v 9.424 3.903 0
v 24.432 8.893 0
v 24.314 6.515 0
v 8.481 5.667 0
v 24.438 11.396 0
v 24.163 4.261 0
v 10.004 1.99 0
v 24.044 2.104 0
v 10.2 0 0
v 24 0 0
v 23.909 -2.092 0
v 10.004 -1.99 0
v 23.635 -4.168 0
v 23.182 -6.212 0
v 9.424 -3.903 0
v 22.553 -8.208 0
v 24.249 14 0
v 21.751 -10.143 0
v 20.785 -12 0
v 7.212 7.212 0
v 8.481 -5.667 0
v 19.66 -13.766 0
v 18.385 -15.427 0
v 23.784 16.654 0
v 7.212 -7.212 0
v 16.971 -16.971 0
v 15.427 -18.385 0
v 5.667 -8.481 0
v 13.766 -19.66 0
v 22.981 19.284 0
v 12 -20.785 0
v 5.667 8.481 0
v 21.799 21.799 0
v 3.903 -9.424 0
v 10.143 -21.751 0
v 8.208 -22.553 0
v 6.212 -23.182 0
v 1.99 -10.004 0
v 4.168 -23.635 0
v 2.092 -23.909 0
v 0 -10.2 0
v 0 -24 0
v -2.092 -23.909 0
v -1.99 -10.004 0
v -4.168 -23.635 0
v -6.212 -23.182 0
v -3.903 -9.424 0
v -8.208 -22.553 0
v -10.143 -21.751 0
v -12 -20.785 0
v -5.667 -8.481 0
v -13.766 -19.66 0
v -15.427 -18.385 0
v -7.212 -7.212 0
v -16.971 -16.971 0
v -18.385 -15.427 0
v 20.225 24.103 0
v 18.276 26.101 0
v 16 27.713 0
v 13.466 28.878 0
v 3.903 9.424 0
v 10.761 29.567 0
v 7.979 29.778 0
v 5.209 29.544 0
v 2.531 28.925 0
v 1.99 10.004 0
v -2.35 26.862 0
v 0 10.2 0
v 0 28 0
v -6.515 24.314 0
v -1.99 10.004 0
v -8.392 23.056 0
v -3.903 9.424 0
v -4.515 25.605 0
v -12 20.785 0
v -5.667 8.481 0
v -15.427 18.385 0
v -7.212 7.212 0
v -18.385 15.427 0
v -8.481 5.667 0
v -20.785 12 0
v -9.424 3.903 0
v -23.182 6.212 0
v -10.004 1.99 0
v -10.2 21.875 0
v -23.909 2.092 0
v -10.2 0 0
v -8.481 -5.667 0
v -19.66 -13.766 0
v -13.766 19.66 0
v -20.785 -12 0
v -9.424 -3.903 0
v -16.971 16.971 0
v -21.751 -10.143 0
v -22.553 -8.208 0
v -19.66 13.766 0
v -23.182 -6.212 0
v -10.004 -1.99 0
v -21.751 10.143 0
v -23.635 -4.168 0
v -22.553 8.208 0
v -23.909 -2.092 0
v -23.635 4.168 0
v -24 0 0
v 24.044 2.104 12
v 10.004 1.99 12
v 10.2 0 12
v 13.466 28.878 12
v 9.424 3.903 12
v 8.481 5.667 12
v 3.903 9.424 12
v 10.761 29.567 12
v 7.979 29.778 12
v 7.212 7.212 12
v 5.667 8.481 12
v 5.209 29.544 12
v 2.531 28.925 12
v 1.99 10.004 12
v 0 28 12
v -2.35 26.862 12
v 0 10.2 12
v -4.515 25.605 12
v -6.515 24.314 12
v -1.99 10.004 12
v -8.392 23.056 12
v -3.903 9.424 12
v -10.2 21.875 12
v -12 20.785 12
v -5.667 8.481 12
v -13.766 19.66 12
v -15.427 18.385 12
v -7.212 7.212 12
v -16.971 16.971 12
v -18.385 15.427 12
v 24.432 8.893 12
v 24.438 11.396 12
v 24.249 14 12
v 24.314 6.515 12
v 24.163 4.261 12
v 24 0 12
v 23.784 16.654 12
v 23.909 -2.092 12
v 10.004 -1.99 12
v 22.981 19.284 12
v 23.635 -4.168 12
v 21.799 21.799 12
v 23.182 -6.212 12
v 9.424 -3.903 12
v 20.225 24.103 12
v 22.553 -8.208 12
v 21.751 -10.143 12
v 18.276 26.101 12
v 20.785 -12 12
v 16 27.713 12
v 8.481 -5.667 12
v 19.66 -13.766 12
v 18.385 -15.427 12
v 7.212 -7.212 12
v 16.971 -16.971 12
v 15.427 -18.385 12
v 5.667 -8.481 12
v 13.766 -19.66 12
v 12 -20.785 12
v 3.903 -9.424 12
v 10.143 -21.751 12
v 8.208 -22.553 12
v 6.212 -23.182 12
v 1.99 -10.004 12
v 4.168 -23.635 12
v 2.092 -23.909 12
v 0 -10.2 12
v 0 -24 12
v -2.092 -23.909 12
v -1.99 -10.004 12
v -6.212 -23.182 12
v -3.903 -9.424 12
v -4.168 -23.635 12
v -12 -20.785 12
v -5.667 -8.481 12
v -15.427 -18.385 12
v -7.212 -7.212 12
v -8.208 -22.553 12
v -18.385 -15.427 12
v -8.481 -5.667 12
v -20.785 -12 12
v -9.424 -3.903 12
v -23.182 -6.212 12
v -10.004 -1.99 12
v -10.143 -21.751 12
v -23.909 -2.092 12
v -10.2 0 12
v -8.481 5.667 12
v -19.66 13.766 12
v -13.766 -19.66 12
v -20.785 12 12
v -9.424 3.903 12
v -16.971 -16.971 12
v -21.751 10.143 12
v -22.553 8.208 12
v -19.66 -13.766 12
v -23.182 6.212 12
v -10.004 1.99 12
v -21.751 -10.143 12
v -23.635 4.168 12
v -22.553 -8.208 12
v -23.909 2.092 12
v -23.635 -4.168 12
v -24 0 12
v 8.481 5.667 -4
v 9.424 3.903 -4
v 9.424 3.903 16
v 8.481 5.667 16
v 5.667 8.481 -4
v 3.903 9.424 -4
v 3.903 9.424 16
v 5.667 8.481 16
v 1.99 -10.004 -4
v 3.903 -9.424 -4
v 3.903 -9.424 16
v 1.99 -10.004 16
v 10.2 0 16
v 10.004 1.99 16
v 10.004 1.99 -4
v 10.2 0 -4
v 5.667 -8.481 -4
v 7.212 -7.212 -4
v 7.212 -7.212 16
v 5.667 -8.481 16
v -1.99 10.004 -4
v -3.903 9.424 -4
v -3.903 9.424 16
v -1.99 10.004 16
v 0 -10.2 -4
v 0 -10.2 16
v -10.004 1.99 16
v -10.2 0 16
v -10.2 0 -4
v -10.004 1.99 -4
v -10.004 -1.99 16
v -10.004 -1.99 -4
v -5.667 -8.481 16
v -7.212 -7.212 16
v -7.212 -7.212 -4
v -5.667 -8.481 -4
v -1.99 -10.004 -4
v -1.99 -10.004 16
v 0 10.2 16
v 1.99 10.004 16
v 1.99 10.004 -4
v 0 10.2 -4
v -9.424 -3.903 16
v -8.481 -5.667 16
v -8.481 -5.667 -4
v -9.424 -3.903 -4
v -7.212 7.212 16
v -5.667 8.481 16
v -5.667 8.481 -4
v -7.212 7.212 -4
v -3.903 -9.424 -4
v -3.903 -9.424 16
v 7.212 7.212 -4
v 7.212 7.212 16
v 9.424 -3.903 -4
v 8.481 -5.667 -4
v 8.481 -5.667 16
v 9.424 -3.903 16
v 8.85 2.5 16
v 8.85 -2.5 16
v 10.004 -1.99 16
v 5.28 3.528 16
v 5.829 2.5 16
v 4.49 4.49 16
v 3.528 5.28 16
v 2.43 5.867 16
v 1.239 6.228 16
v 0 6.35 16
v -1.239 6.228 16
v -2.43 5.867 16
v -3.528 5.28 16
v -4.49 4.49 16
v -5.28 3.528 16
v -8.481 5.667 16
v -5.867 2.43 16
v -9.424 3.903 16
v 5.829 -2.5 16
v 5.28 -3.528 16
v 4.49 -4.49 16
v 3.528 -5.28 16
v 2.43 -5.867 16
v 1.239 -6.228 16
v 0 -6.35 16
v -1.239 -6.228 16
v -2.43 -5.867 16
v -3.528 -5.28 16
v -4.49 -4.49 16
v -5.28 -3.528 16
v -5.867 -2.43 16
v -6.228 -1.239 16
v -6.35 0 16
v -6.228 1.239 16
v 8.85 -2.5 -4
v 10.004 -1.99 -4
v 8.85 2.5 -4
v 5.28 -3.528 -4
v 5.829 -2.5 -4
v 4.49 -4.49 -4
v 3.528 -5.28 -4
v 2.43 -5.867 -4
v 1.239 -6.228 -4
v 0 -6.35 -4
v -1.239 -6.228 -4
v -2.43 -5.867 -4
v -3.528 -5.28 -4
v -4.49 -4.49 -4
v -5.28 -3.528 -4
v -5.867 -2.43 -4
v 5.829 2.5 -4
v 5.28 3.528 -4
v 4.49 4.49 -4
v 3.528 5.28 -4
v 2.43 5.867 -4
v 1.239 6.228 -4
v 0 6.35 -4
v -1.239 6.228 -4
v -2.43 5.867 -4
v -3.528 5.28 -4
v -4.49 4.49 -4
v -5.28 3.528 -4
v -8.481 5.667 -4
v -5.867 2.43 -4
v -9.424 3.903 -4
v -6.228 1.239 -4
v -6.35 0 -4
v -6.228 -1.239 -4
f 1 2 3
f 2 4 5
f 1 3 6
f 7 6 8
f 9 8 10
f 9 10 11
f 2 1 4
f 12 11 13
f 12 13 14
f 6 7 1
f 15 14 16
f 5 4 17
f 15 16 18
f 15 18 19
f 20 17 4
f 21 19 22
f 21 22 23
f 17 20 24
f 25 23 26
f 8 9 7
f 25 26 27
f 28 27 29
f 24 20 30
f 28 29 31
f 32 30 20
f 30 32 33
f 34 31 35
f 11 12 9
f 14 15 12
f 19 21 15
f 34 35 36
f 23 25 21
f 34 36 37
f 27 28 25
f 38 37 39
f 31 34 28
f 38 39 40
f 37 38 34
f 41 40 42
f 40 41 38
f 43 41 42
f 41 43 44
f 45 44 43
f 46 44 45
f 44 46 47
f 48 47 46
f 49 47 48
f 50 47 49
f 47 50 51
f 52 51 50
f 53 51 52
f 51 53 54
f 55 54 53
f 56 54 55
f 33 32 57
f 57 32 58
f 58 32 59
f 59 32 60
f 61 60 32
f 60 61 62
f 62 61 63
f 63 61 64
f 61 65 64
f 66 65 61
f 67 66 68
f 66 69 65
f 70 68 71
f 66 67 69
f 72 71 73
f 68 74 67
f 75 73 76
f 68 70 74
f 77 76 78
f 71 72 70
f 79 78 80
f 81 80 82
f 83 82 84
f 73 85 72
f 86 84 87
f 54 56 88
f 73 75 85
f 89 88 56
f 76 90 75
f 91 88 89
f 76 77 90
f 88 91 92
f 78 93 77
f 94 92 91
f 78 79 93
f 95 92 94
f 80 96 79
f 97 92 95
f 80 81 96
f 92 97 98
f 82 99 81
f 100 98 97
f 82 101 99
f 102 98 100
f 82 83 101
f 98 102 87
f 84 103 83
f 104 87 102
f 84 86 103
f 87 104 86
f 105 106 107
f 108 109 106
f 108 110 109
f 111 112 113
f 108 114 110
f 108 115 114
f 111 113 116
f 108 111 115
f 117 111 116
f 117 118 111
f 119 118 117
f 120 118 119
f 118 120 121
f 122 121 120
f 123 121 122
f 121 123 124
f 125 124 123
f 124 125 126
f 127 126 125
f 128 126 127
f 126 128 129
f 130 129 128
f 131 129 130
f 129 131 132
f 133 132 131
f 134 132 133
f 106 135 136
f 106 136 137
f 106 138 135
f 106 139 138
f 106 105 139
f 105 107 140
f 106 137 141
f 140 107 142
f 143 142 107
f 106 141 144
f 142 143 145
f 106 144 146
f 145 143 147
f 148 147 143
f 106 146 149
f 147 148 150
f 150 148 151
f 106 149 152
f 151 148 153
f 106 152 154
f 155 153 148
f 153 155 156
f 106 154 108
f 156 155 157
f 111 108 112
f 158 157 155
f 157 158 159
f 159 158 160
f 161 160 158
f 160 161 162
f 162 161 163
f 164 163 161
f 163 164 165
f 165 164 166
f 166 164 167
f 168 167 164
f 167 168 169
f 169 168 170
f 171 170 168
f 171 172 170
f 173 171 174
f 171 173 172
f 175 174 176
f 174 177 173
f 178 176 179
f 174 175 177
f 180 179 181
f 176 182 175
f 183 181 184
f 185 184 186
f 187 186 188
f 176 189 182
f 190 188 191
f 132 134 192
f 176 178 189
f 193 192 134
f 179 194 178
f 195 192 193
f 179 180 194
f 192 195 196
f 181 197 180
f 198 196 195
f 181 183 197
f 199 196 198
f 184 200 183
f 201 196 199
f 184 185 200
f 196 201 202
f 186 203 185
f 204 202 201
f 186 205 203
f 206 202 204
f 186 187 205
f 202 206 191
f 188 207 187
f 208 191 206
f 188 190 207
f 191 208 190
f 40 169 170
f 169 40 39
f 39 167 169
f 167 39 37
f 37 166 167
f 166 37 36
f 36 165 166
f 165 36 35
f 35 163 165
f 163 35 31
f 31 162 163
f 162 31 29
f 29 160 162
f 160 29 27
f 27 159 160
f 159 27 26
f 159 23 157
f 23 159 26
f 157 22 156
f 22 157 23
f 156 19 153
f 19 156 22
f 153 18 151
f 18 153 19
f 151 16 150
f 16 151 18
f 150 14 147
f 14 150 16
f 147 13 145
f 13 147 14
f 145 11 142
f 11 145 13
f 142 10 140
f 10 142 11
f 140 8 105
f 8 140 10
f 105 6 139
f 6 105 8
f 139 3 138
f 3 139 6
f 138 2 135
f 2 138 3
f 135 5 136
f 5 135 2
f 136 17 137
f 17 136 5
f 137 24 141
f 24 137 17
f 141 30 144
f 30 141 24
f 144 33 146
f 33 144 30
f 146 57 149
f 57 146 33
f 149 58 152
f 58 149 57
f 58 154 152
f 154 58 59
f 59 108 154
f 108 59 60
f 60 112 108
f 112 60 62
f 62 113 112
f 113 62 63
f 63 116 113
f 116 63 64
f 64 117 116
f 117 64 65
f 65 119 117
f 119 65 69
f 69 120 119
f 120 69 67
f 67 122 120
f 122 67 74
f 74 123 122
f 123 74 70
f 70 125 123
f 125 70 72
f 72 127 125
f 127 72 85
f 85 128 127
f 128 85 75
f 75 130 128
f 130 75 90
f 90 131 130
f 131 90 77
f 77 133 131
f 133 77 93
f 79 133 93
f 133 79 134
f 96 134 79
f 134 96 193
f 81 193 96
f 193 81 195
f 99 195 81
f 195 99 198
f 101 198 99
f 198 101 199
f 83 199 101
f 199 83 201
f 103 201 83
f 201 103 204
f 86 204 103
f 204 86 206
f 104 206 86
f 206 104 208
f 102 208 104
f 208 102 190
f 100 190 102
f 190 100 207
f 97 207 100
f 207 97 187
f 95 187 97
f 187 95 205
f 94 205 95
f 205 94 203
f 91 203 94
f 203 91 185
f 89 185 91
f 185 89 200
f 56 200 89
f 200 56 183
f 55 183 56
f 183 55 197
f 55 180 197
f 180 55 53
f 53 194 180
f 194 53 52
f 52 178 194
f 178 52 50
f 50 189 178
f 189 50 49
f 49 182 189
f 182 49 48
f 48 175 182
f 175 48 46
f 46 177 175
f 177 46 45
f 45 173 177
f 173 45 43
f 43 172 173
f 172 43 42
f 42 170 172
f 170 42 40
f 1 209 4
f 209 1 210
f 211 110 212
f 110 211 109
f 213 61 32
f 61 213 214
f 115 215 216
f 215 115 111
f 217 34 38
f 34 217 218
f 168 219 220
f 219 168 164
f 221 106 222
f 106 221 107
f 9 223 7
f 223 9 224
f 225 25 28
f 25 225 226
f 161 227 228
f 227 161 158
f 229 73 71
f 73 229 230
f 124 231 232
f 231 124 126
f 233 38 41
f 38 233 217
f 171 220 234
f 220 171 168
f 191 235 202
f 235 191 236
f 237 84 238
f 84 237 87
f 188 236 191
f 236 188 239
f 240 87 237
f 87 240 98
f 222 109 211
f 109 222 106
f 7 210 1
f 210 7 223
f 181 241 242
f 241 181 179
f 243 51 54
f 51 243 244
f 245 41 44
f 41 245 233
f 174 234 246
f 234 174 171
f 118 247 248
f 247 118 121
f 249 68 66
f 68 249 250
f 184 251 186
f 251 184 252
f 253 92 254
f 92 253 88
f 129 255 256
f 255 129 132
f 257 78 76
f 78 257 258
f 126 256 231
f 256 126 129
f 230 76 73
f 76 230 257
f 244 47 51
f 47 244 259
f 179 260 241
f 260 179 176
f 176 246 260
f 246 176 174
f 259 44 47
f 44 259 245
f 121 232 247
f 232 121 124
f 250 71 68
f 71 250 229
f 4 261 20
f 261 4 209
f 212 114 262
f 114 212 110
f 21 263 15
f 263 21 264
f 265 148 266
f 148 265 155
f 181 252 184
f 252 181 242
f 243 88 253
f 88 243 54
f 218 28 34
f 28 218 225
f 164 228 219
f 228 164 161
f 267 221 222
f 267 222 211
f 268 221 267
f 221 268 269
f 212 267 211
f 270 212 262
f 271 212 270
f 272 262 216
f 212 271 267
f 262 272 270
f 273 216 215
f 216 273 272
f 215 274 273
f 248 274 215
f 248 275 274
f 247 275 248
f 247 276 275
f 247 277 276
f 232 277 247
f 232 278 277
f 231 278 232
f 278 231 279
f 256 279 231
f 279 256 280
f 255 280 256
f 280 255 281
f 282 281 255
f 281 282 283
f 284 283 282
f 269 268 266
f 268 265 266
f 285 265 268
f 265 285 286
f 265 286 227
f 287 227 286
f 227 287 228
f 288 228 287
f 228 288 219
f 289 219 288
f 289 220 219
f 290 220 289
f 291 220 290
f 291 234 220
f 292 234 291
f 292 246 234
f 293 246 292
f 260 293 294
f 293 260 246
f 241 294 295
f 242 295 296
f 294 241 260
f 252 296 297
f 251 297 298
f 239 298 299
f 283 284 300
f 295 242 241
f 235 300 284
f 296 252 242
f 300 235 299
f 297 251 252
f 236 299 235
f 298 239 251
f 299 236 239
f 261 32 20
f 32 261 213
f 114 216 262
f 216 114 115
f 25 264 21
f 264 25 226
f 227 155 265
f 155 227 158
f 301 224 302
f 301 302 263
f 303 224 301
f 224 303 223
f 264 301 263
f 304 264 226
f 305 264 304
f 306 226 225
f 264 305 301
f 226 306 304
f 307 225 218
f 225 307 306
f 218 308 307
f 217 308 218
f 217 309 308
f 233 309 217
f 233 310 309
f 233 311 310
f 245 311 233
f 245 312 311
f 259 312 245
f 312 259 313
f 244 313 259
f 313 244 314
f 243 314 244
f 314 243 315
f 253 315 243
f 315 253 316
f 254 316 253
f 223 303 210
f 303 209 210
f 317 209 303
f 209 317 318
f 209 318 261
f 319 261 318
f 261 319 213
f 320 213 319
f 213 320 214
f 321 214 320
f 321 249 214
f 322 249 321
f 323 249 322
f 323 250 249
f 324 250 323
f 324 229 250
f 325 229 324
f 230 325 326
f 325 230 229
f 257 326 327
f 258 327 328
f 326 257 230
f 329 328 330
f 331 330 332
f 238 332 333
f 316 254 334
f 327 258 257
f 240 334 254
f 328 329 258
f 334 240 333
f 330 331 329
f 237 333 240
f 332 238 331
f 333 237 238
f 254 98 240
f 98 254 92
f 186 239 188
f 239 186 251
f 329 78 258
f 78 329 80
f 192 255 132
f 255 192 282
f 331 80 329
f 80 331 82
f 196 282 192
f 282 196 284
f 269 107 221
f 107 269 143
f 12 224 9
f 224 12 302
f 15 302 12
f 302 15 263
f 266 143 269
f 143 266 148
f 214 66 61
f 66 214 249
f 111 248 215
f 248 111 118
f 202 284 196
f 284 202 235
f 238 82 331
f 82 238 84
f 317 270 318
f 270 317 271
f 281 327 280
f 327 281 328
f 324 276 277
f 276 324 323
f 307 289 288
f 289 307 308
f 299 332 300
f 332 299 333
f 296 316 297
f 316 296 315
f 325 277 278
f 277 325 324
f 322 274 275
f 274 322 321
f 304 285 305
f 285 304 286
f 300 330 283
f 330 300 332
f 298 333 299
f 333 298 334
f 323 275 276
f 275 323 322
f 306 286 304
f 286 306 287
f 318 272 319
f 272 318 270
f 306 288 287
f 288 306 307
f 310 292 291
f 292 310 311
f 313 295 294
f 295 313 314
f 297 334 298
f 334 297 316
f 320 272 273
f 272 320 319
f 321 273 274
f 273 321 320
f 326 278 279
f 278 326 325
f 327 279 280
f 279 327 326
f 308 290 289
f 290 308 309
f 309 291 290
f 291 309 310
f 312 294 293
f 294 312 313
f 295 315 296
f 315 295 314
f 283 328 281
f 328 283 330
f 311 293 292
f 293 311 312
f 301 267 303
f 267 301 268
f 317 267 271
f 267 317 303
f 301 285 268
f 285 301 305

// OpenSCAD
$fn = 32;

// ----------------------------------------------------------------------
// Cam: base radius 24 mm with a 8 mm lift over 120 degrees
// ----------------------------------------------------------------------

// --- parameters (mm) ---
base_r = 24;              // base radius
lift = 8;                 // lift height above the base radius
lift_span = 120;          // angular width of the lift
lift_start = 0;           // angle where the lift starts
cam_t = 12;               // cam plate thickness
hub_d = 20.4;             // hub diameter
hub_h = 20;               // hub height
bore_d = 12.7;            // bore
key_w = 5;                // keyway width
key_depth = 1.85;         // keyway depth

cam_profile = [[24, 0], [24.044, 2.104], [24.163, 4.261], [24.314, 6.515], [24.432, 8.893], [24.438, 11.396], [24.249, 14], [23.784, 16.654], [22.981, 19.284], [21.799, 21.799], [20.225, 24.103], [18.276, 26.101], [16, 27.713], [13.466, 28.878], [10.761, 29.567], [7.979, 29.778], [5.209, 29.544], [2.531, 28.925], [0, 28], [-2.35, 26.862], [-4.515, 25.605], [-6.515, 24.314], [-8.392, 23.056], [-10.2, 21.875], [-12, 20.785], [-13.766, 19.66], [-15.427, 18.385], [-16.971, 16.971], [-18.385, 15.427], [-19.66, 13.766], [-20.785, 12], [-21.751, 10.143], [-22.553, 8.208], [-23.182, 6.212], [-23.635, 4.168], [-23.909, 2.092], [-24, 0], [-23.909, -2.092], [-23.635, -4.168], [-23.182, -6.212], [-22.553, -8.208], [-21.751, -10.143], [-20.785, -12], [-19.66, -13.766], [-18.385, -15.427], [-16.971, -16.971], [-15.427, -18.385], [-13.766, -19.66], [-12, -20.785], [-10.143, -21.751], [-8.208, -22.553], [-6.212, -23.182], [-4.168, -23.635], [-2.092, -23.909], [0, -24], [2.092, -23.909], [4.168, -23.635], [6.212, -23.182], [8.208, -22.553], [10.143, -21.751], [12, -20.785], [13.766, -19.66], [15.427, -18.385], [16.971, -16.971], [18.385, -15.427], [19.66, -13.766], [20.785, -12], [21.751, -10.143], [22.553, -8.208], [23.182, -6.212], [23.635, -4.168], [23.909, -2.092]];

difference() {
  union() {
    linear_extrude(height = cam_t) polygon(cam_profile);
    /* hub, proud of the cam plate on both sides */
    translate([0, 0, -4]) cylinder(h = hub_h, d = hub_d);
  }
  /* bore through the hub, 2.5 mm clear on both faces */
  translate([0, 0, -6.5]) cylinder(h = hub_h + 5, d = bore_d);
  /* keyway, milled through the whole hub */
  translate([4.5, -2.5, -6.5]) cube([4.35, 5, 25]);
}
